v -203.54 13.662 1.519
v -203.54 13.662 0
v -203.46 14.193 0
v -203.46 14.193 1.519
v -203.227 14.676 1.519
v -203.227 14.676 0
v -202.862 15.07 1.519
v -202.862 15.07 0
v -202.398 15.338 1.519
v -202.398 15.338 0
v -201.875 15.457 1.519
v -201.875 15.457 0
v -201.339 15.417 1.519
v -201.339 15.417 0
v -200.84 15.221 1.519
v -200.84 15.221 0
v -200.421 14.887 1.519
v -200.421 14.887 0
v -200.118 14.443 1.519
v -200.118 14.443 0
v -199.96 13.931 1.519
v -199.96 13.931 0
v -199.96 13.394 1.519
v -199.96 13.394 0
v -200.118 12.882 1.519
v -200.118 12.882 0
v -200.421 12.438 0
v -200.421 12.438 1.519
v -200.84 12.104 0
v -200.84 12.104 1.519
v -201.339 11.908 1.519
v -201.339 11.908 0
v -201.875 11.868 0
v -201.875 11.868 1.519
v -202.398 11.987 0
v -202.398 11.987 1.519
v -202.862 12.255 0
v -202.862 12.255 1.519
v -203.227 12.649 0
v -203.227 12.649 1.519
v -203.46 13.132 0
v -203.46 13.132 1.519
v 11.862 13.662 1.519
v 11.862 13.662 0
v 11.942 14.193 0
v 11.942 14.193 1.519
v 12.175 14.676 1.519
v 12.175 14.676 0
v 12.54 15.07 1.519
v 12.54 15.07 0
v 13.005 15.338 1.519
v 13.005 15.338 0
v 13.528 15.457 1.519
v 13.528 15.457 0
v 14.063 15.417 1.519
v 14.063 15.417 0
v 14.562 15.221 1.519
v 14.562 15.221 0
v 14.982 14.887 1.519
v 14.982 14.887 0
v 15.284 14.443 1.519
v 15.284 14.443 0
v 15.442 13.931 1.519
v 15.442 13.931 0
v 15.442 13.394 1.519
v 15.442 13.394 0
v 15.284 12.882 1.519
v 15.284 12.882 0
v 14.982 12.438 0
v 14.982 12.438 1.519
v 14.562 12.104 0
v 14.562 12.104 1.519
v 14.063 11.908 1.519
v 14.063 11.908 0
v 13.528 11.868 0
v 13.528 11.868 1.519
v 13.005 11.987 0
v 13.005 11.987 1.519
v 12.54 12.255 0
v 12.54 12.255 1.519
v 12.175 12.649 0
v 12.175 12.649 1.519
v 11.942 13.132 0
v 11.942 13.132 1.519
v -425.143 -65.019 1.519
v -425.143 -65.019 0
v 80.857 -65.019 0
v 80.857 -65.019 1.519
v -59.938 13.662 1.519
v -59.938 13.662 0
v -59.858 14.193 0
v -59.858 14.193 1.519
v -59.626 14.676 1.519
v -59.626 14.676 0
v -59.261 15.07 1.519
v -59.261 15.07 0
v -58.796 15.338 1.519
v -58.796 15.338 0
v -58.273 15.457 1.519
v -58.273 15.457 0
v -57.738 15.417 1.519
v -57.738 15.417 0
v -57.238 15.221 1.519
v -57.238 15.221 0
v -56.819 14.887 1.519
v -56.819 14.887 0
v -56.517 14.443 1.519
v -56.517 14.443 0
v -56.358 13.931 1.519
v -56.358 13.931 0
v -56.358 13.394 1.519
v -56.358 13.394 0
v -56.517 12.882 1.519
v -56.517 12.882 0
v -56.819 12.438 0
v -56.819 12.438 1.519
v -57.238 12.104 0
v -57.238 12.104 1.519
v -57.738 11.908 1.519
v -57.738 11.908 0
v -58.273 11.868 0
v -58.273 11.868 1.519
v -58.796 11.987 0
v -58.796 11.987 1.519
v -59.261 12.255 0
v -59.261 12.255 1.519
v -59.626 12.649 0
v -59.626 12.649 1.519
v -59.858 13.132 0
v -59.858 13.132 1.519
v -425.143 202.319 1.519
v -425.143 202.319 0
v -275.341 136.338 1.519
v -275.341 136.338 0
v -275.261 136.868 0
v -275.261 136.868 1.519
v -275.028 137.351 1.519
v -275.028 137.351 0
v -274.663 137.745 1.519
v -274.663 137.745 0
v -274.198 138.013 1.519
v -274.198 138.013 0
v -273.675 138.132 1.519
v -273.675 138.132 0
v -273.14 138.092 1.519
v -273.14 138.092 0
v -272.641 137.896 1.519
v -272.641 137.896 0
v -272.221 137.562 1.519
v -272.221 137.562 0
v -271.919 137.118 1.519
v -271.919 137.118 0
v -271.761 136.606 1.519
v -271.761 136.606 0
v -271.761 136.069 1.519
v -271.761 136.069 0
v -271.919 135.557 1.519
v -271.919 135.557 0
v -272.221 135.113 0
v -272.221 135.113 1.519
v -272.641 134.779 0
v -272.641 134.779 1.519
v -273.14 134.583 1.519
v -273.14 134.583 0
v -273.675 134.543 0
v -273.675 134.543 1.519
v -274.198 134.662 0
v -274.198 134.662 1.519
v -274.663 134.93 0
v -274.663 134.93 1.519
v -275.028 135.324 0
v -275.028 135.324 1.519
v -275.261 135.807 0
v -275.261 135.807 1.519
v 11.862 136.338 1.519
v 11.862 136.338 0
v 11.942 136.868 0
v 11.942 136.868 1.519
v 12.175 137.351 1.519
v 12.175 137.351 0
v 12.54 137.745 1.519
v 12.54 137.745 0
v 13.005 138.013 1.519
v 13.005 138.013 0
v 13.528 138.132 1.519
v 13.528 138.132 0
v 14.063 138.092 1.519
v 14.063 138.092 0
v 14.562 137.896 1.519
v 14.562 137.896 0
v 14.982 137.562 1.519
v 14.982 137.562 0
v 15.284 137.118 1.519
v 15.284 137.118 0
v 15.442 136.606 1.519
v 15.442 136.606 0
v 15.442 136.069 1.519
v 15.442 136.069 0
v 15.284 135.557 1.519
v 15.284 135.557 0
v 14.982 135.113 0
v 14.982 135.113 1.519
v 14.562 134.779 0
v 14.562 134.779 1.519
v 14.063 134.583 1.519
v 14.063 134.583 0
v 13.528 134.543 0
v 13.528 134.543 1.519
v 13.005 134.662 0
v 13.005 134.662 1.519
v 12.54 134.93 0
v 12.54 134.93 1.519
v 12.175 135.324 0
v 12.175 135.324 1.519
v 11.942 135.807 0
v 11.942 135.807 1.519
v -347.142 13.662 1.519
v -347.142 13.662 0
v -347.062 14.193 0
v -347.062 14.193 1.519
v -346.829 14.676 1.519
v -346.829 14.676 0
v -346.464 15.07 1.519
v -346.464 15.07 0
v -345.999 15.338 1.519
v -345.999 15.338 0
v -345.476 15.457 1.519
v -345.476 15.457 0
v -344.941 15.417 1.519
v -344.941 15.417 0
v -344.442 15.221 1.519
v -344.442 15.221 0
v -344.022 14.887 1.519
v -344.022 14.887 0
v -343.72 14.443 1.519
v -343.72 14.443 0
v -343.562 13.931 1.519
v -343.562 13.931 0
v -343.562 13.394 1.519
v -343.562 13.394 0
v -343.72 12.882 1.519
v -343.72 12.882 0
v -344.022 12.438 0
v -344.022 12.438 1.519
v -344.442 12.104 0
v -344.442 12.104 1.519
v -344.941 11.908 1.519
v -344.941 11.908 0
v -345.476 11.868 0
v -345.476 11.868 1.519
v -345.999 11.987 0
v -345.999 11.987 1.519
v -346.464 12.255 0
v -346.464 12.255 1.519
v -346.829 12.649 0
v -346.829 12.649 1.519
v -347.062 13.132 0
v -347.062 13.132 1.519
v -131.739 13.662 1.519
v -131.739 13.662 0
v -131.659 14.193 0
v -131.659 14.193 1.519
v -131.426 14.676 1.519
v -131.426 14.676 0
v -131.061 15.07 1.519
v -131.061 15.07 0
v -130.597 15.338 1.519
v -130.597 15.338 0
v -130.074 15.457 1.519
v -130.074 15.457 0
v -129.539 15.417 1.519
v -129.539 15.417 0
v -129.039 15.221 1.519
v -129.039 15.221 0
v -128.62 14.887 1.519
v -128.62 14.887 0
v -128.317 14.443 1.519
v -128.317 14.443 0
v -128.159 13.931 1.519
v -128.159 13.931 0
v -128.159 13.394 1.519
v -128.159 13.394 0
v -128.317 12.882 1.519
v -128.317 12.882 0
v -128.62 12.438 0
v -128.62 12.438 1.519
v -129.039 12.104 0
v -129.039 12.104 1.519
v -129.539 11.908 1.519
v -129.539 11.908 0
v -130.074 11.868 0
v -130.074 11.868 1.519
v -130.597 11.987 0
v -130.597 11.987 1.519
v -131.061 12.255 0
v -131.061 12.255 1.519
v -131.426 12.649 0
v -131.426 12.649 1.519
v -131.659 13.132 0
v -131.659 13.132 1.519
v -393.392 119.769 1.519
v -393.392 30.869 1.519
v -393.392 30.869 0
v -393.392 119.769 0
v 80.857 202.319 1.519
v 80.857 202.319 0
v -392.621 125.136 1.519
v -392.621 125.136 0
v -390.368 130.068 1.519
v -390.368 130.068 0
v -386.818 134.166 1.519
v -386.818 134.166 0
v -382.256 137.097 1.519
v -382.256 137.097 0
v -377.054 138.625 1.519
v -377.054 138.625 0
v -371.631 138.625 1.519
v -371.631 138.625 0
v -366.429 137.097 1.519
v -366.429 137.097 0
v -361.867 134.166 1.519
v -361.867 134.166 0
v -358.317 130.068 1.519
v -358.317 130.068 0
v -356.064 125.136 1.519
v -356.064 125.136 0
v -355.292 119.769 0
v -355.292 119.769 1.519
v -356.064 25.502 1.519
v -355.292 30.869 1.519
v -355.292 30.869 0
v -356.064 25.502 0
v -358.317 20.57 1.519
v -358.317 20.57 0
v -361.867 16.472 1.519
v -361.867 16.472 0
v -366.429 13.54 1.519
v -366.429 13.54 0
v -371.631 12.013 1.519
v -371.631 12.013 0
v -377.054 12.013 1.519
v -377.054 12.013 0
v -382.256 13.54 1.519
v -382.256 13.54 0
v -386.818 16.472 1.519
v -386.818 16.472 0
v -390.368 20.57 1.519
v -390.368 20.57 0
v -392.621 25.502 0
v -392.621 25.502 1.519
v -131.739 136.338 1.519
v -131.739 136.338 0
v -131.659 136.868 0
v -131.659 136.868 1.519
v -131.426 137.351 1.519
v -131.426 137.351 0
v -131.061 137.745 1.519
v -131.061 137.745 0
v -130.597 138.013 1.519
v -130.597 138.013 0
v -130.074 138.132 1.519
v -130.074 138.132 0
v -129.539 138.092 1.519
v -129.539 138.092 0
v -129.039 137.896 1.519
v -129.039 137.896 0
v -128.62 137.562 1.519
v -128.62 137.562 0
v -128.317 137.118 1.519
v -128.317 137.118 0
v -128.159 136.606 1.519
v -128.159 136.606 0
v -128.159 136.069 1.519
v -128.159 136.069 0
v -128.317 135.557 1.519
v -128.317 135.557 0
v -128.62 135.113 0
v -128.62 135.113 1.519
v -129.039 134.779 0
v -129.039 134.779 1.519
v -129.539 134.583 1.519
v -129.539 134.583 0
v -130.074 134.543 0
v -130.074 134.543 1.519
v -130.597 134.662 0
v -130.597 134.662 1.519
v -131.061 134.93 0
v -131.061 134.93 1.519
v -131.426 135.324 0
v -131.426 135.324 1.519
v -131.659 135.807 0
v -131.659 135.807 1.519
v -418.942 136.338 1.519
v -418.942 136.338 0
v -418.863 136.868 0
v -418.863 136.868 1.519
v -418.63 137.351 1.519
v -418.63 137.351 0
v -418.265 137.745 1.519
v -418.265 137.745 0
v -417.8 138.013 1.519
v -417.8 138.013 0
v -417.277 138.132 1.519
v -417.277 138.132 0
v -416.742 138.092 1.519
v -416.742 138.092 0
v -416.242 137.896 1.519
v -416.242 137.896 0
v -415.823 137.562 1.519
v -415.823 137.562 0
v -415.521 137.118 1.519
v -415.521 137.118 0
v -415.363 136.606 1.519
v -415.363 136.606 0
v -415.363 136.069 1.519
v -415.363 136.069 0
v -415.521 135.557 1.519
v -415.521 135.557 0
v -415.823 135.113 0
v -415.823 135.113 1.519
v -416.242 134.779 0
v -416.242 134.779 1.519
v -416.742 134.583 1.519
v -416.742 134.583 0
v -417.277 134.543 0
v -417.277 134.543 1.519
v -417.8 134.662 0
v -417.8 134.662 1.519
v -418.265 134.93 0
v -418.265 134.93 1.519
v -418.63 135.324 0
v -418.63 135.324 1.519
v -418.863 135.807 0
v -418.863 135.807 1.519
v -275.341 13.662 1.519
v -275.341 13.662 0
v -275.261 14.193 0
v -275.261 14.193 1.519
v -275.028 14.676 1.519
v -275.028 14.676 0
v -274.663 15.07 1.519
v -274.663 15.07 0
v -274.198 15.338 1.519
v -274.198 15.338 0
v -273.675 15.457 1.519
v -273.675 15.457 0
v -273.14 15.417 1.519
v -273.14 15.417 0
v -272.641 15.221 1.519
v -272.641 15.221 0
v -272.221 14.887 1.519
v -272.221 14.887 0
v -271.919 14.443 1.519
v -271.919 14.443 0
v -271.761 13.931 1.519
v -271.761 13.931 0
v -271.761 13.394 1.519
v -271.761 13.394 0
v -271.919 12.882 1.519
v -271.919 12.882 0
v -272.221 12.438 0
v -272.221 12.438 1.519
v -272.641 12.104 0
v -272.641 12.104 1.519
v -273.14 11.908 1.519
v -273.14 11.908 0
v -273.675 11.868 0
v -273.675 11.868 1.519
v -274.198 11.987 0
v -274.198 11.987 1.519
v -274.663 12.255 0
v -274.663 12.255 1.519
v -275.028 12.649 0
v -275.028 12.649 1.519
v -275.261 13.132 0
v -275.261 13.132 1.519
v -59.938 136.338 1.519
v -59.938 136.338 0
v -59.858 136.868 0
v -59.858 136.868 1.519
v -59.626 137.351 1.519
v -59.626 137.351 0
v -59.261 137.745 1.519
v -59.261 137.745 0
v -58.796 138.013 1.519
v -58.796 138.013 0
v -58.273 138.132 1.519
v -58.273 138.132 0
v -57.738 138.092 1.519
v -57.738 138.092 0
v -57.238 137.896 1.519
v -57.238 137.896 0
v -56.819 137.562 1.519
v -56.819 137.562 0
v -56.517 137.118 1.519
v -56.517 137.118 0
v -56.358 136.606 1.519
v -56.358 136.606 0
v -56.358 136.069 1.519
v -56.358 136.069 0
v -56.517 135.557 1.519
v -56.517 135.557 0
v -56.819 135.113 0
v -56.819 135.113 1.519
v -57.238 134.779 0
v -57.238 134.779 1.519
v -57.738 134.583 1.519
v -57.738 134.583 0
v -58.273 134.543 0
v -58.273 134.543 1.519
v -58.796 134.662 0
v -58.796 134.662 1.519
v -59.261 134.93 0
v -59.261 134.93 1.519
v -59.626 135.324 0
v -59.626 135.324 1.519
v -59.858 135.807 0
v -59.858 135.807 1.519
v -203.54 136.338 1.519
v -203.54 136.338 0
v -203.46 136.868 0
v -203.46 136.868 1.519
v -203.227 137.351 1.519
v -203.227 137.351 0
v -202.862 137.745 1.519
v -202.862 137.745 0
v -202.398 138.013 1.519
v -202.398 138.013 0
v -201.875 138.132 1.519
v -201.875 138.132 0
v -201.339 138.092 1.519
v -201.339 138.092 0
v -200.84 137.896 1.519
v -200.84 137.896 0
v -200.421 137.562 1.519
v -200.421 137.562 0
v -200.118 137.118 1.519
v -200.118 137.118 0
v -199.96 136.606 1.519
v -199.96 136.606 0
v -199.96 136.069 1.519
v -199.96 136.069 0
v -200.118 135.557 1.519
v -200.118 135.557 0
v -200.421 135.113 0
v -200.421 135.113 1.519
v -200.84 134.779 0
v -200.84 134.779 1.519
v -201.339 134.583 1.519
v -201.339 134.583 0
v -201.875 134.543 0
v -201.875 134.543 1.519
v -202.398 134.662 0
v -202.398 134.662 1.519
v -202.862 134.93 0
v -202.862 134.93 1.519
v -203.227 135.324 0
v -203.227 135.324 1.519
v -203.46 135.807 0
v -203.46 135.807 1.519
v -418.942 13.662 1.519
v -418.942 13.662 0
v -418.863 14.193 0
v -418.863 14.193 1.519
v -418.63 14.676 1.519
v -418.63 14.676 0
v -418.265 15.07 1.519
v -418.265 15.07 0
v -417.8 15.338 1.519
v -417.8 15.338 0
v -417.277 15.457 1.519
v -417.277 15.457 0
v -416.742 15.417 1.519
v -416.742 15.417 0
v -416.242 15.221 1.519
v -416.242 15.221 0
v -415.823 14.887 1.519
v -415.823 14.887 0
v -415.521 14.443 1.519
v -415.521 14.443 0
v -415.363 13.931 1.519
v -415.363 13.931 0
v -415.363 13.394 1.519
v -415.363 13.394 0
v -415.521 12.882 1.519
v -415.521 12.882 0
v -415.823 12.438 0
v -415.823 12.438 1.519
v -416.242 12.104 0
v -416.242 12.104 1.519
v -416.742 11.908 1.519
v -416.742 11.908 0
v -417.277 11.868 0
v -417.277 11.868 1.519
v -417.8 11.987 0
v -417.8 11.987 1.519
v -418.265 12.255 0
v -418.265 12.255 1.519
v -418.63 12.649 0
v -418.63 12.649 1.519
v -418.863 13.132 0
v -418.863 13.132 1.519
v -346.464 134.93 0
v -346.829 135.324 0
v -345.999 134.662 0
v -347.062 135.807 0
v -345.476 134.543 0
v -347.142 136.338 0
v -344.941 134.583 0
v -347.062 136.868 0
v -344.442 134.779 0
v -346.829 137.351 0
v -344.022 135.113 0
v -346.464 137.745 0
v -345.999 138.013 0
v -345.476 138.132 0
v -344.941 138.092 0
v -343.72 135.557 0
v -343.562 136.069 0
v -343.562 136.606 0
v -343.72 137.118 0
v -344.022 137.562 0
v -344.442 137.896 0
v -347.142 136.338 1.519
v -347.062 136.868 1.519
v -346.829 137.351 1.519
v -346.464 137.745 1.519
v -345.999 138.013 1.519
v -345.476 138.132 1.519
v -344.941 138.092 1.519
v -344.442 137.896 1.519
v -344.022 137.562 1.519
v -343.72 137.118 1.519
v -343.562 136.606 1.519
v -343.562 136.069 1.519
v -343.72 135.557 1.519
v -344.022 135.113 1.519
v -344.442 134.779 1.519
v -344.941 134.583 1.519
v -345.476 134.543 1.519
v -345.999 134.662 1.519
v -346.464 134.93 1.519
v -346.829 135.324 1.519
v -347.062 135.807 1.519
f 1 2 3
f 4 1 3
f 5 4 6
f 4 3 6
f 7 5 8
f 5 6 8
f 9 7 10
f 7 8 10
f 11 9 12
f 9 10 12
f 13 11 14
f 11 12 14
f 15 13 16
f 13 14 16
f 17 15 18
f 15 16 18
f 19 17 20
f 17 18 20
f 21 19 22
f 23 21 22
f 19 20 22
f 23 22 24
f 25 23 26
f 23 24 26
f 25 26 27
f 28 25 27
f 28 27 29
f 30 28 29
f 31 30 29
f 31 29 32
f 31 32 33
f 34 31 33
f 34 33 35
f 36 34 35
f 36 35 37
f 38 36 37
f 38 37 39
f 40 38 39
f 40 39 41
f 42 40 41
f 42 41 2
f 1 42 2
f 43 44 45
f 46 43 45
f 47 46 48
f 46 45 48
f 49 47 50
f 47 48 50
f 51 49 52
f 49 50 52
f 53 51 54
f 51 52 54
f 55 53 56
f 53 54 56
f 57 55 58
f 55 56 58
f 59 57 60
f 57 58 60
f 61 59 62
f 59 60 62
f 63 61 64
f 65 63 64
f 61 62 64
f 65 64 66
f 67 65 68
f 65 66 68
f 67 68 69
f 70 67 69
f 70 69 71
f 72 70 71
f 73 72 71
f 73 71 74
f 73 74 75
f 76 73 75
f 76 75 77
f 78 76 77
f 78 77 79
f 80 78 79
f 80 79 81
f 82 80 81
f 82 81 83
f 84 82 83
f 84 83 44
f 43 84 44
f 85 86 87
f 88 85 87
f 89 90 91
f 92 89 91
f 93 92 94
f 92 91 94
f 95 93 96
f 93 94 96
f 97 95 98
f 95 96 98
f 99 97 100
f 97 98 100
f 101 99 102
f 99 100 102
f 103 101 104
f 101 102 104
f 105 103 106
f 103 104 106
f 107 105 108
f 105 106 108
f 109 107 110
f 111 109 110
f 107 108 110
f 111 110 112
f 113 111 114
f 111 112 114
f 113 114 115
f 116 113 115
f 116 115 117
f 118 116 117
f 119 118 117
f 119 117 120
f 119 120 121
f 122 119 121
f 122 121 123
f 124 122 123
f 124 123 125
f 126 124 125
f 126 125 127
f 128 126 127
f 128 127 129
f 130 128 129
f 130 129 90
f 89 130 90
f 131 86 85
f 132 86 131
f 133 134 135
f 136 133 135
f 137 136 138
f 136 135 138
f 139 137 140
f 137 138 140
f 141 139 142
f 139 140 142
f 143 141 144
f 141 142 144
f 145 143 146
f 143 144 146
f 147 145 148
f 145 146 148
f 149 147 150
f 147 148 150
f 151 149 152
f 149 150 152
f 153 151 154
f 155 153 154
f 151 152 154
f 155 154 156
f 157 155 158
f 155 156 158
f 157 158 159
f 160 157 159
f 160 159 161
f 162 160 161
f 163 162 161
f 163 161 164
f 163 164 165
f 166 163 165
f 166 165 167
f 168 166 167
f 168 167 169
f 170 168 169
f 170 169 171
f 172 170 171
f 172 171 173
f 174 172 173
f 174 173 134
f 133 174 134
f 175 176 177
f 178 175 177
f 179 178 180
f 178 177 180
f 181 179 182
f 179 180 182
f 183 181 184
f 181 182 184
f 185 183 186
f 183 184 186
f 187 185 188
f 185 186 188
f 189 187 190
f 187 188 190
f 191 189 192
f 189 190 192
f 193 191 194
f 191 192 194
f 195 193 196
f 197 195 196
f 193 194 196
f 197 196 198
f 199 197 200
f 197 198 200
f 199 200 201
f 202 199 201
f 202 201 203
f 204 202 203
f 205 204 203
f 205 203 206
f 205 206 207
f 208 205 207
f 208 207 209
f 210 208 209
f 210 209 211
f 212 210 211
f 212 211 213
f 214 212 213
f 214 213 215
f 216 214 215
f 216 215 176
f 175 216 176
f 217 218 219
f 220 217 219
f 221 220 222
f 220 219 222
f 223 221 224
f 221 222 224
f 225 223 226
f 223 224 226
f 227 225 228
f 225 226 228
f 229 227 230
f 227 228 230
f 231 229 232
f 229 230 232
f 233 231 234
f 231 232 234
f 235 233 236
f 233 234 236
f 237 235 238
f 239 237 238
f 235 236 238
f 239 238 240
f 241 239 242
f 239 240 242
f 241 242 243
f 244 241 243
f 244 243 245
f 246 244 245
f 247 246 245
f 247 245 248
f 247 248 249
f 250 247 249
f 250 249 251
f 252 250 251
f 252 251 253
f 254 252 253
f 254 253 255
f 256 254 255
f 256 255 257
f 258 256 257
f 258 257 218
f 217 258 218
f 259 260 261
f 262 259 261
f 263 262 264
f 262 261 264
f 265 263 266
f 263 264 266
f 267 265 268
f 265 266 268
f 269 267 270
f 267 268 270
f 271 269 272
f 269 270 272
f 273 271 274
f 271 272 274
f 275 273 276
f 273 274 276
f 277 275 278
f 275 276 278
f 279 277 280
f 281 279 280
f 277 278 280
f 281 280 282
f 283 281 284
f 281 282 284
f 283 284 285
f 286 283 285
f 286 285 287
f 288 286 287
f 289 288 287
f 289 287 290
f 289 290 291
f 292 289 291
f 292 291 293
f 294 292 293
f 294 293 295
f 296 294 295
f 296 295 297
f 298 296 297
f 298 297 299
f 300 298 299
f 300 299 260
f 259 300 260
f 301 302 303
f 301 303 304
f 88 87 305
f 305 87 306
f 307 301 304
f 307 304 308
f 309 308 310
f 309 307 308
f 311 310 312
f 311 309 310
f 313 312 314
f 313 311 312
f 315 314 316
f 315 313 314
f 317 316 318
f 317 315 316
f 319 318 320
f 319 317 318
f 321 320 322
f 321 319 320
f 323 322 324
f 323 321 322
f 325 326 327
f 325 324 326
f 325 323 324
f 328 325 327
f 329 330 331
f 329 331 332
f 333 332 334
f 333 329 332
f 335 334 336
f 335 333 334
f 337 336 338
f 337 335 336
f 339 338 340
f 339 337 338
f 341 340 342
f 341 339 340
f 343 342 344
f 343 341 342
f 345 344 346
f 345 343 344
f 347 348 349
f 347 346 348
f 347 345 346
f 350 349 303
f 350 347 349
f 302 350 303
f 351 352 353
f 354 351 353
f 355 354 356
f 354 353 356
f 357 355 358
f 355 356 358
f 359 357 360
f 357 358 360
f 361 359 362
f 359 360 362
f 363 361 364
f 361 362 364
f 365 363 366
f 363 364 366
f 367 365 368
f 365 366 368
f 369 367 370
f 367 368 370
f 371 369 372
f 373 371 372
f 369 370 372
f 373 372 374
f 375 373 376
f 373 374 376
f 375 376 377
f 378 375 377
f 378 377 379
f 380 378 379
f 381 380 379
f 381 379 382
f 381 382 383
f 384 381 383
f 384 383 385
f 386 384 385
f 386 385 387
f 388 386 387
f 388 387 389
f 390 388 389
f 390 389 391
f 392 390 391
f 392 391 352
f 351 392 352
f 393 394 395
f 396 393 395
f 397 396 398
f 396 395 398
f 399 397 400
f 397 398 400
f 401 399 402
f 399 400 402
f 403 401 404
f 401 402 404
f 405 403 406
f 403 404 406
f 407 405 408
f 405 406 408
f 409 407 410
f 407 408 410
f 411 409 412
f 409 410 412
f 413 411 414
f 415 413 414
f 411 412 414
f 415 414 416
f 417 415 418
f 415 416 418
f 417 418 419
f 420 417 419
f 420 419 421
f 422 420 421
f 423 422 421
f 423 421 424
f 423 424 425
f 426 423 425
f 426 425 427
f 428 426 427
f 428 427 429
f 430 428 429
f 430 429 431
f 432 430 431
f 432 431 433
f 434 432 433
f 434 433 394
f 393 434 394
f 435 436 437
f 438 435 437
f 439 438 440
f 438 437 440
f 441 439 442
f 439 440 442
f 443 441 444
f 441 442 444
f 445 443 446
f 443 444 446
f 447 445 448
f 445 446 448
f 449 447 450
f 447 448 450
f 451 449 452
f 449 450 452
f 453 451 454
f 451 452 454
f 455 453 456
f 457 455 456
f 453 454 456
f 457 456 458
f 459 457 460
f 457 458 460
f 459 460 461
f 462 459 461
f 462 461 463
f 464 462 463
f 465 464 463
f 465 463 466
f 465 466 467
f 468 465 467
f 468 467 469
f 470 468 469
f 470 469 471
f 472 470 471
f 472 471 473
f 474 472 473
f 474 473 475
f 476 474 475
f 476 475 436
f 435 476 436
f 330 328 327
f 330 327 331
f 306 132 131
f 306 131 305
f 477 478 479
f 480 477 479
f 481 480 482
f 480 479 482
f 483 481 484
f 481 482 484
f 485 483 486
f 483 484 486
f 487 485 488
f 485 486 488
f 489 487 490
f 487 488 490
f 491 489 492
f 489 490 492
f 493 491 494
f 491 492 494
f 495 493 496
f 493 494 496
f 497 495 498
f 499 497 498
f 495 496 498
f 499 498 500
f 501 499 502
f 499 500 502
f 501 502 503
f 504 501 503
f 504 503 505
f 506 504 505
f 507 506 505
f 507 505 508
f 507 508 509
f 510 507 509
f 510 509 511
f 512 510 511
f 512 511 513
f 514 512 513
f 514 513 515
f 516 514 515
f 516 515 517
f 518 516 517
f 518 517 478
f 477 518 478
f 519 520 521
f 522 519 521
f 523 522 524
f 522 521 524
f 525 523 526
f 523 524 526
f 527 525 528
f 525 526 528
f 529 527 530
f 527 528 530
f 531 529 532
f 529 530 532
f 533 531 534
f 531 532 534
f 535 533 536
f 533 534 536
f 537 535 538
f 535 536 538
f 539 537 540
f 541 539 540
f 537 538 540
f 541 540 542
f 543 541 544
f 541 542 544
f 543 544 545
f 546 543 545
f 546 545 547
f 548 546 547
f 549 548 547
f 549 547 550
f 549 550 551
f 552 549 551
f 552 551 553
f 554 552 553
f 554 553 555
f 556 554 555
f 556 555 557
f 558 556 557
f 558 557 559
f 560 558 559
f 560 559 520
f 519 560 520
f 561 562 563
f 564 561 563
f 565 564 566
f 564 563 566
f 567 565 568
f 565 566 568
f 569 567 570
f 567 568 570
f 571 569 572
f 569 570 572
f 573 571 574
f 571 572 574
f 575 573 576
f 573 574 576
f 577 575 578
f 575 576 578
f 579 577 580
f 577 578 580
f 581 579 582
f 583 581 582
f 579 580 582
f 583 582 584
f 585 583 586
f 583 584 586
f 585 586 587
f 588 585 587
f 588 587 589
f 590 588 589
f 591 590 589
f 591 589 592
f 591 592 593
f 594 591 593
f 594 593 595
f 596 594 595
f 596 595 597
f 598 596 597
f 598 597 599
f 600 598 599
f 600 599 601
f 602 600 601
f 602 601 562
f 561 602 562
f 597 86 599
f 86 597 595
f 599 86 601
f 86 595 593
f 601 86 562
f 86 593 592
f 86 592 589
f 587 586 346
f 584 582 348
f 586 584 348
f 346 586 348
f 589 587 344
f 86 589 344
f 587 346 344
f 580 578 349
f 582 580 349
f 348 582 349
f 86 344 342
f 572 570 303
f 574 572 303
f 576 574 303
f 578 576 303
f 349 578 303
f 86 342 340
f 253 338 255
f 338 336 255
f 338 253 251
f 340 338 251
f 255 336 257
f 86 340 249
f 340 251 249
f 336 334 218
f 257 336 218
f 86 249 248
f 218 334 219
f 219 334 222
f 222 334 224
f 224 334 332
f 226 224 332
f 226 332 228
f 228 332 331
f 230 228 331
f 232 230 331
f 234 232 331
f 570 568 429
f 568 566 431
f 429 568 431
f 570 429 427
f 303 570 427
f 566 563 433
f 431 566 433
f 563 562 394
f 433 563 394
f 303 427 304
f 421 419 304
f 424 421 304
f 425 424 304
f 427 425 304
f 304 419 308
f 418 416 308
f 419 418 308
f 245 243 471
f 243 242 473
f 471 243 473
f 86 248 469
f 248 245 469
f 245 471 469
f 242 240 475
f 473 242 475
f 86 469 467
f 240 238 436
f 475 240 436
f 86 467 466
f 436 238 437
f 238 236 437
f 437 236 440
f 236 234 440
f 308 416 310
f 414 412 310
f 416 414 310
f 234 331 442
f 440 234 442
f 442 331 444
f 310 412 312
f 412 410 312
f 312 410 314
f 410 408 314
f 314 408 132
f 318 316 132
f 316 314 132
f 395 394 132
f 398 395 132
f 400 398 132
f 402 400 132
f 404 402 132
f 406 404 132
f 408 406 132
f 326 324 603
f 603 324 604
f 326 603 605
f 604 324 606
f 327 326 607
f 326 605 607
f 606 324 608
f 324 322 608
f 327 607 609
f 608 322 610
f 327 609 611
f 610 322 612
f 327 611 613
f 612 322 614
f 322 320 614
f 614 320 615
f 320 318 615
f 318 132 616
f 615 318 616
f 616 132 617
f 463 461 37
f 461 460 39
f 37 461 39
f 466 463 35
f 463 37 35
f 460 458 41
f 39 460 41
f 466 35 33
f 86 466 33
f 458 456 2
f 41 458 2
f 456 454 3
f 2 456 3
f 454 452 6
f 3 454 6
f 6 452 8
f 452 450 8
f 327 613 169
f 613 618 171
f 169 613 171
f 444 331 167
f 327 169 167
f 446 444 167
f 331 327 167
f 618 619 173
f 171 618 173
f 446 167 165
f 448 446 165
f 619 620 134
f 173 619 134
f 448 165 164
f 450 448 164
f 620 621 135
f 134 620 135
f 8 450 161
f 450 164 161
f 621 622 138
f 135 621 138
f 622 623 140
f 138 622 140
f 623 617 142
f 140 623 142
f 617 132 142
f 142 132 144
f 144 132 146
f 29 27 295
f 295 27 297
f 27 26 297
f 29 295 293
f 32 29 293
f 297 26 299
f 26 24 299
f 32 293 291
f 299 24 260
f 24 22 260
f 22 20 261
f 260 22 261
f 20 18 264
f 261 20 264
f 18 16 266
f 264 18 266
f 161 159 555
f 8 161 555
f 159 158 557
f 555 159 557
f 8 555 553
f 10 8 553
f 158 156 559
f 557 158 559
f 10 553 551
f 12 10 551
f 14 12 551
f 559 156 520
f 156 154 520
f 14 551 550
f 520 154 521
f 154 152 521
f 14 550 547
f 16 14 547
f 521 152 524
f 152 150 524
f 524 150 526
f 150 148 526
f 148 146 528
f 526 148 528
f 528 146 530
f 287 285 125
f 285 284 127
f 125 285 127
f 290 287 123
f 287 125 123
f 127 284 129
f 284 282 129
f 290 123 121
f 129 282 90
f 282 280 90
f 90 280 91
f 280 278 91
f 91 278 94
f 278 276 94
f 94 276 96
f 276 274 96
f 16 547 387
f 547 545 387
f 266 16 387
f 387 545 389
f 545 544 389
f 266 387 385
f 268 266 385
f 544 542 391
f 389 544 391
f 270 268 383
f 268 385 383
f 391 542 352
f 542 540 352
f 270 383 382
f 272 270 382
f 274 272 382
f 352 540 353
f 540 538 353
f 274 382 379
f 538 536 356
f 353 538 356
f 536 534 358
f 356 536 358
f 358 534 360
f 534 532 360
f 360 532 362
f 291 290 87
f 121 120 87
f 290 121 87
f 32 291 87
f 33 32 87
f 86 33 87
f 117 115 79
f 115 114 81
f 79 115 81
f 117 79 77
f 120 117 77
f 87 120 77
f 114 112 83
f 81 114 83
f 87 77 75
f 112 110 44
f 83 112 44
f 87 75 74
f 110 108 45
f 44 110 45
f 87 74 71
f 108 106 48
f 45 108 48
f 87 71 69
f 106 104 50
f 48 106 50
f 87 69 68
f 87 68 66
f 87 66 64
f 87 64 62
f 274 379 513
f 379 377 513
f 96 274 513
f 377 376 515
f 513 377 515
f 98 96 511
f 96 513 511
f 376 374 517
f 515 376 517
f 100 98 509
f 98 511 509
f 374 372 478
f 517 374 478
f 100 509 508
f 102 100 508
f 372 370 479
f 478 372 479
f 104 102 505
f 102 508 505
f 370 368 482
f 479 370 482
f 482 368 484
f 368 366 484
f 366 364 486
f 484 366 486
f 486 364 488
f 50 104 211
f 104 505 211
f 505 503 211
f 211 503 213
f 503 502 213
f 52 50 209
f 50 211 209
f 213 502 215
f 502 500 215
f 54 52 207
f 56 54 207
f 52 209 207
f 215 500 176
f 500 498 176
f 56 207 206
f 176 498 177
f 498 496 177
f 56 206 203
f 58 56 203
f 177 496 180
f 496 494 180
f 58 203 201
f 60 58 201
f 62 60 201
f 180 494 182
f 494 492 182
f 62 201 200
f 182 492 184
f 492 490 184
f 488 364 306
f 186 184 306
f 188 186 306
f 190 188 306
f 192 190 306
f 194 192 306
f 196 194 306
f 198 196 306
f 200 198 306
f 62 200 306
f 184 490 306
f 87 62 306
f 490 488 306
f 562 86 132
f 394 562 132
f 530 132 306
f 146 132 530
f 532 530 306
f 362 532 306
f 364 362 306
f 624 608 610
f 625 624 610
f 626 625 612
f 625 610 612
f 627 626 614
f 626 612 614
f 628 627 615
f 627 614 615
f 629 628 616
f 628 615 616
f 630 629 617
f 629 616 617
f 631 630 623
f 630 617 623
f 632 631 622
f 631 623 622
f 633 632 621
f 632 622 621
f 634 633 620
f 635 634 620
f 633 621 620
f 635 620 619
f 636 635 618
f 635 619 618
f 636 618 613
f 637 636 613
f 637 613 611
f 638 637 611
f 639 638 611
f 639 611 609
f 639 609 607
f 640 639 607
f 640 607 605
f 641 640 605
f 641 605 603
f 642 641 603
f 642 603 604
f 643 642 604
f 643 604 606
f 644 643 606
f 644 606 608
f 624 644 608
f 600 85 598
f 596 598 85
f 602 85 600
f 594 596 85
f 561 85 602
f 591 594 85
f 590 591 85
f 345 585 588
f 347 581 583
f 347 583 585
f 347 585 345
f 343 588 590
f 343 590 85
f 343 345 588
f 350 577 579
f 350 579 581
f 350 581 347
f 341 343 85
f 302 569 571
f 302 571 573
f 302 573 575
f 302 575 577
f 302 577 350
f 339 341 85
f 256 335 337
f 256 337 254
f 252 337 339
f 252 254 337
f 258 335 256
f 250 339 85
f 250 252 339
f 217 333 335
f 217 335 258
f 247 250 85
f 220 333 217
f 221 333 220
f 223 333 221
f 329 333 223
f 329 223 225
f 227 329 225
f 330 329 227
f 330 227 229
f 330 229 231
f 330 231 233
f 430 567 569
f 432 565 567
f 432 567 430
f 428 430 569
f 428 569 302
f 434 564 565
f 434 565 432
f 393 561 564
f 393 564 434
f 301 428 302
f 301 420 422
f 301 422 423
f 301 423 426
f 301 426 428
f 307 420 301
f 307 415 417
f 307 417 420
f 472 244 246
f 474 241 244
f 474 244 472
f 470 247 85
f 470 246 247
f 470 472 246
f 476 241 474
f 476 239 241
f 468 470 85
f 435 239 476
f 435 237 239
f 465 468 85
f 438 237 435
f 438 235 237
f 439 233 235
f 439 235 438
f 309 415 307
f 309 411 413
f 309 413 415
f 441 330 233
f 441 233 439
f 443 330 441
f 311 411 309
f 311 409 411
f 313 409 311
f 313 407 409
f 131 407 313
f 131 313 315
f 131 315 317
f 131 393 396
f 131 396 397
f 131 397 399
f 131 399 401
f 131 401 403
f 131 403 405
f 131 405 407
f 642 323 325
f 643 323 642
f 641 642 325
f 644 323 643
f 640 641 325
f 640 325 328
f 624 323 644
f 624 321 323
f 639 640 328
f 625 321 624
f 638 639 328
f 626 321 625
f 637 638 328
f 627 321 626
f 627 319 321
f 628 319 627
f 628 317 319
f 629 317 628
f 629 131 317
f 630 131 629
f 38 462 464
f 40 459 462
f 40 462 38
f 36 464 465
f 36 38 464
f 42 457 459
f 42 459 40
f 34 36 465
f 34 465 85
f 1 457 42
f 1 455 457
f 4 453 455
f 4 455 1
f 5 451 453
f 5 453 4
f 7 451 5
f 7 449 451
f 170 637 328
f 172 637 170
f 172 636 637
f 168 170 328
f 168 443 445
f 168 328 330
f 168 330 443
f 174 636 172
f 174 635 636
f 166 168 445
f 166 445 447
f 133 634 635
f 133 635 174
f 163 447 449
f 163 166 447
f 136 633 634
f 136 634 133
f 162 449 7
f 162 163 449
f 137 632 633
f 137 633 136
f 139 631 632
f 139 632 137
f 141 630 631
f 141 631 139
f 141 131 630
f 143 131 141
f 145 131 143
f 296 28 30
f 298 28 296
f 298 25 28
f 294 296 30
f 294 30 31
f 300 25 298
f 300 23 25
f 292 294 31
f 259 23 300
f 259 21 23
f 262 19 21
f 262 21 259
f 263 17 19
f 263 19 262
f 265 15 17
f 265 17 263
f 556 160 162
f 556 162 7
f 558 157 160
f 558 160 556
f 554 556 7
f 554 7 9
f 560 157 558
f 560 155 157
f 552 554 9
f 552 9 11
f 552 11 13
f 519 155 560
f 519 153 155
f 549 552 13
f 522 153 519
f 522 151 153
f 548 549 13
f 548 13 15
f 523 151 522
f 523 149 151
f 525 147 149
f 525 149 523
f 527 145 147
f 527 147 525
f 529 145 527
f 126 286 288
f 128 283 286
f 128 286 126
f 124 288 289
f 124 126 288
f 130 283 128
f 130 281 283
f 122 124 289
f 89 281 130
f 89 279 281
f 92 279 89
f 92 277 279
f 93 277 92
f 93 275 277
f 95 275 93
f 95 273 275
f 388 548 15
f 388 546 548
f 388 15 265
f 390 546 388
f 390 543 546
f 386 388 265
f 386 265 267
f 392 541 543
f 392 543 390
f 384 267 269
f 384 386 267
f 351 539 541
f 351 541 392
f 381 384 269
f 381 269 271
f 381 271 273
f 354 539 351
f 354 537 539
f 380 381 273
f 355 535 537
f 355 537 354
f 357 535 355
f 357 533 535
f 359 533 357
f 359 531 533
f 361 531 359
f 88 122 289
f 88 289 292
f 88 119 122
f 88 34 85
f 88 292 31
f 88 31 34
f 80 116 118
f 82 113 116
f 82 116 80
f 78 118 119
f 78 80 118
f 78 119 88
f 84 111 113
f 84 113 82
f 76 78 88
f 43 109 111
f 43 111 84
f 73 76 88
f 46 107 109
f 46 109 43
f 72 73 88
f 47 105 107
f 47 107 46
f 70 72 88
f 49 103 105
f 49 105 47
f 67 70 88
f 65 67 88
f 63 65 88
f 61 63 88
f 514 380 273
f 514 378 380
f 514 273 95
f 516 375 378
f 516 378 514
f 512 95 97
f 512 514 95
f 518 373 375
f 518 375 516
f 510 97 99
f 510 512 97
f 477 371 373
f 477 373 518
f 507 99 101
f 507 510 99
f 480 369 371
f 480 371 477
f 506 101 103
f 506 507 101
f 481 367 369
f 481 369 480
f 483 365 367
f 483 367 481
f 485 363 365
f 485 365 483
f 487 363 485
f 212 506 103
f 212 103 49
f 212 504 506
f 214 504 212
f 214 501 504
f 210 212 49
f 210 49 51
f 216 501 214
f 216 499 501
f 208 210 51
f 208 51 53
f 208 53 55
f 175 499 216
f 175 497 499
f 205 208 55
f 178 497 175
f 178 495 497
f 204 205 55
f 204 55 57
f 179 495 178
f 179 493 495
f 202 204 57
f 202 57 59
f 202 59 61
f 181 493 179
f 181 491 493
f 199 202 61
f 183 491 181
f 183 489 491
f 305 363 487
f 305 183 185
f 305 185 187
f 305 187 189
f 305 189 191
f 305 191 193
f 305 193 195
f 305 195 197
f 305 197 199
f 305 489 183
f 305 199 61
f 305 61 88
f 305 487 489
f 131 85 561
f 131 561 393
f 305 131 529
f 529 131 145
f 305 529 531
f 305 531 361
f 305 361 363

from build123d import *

# Parameters (mm, degrees)
SKETCH1_W                = 506
SKETCH1_H                = 267.33784
BASE_FLANGE1_DEPTH       = 1.51892
CUT_EXTRUDE1_DEPTH       = 2.54
M3_CLEARANCE_HOLE1_D     = 3.6
M3_CLEARANCE_HOLE1_DEPTH = 11.938
M3_CLEARANCE_HOLE1_TIP   = 1.081549114


# Sheet-metal steps are written as plain solids
with BuildPart() as part:
    # Sketch1 → Base-Flange1 (new body)
    with BuildSketch(Plane.XY):
        with Locations((-172.1425, 68.65)):
            Rectangle(SKETCH1_W, SKETCH1_H)
    extrude(amount=BASE_FLANGE1_DEPTH)

    # Sketch6 → Cut-Extrude1 (cut)
    with BuildSketch(Plane.XY.offset(1.51892)):
        with BuildLine():
            Line((-393.3925, 30.86892), (-393.3925, 119.76892))
            ThreePointArc((-393.3925, 119.76892), (-374.3425, 138.81892), (-355.2925, 119.76892))
            Line((-355.2925, 119.76892), (-355.2925, 30.86892))
            ThreePointArc((-355.2925, 30.86892), (-374.3425, 11.81892), (-393.3925, 30.86892))
        make_face()
    extrude(amount=-CUT_EXTRUDE1_DEPTH, mode=Mode.SUBTRACT)

    # M3 Clearance Hole1
    with Locations(Plane.XY.offset(1.51892)):
        with Locations((-417.1425, 136.3375), (-417.1425, 13.6625), (-345.341667, 136.3375), (-345.341667, 13.6625), (-273.540834, 136.3375), (-273.540834, 13.6625), (-201.740001, 136.3375), (-201.740001, 13.6625), (-129.939168, 136.3375), (-129.939168, 13.6625), (-58.138335, 136.3375), (-58.138335, 13.6625), (13.662498, 136.3375), (13.662498, 13.6625)):
            Hole(M3_CLEARANCE_HOLE1_D / 2, depth=M3_CLEARANCE_HOLE1_DEPTH)
            with Locations((0, 0, -(M3_CLEARANCE_HOLE1_DEPTH + M3_CLEARANCE_HOLE1_TIP / 2))):  # 118° drill point
                Cone(0, M3_CLEARANCE_HOLE1_D / 2, M3_CLEARANCE_HOLE1_TIP, mode=Mode.SUBTRACT)


solid = part.part
